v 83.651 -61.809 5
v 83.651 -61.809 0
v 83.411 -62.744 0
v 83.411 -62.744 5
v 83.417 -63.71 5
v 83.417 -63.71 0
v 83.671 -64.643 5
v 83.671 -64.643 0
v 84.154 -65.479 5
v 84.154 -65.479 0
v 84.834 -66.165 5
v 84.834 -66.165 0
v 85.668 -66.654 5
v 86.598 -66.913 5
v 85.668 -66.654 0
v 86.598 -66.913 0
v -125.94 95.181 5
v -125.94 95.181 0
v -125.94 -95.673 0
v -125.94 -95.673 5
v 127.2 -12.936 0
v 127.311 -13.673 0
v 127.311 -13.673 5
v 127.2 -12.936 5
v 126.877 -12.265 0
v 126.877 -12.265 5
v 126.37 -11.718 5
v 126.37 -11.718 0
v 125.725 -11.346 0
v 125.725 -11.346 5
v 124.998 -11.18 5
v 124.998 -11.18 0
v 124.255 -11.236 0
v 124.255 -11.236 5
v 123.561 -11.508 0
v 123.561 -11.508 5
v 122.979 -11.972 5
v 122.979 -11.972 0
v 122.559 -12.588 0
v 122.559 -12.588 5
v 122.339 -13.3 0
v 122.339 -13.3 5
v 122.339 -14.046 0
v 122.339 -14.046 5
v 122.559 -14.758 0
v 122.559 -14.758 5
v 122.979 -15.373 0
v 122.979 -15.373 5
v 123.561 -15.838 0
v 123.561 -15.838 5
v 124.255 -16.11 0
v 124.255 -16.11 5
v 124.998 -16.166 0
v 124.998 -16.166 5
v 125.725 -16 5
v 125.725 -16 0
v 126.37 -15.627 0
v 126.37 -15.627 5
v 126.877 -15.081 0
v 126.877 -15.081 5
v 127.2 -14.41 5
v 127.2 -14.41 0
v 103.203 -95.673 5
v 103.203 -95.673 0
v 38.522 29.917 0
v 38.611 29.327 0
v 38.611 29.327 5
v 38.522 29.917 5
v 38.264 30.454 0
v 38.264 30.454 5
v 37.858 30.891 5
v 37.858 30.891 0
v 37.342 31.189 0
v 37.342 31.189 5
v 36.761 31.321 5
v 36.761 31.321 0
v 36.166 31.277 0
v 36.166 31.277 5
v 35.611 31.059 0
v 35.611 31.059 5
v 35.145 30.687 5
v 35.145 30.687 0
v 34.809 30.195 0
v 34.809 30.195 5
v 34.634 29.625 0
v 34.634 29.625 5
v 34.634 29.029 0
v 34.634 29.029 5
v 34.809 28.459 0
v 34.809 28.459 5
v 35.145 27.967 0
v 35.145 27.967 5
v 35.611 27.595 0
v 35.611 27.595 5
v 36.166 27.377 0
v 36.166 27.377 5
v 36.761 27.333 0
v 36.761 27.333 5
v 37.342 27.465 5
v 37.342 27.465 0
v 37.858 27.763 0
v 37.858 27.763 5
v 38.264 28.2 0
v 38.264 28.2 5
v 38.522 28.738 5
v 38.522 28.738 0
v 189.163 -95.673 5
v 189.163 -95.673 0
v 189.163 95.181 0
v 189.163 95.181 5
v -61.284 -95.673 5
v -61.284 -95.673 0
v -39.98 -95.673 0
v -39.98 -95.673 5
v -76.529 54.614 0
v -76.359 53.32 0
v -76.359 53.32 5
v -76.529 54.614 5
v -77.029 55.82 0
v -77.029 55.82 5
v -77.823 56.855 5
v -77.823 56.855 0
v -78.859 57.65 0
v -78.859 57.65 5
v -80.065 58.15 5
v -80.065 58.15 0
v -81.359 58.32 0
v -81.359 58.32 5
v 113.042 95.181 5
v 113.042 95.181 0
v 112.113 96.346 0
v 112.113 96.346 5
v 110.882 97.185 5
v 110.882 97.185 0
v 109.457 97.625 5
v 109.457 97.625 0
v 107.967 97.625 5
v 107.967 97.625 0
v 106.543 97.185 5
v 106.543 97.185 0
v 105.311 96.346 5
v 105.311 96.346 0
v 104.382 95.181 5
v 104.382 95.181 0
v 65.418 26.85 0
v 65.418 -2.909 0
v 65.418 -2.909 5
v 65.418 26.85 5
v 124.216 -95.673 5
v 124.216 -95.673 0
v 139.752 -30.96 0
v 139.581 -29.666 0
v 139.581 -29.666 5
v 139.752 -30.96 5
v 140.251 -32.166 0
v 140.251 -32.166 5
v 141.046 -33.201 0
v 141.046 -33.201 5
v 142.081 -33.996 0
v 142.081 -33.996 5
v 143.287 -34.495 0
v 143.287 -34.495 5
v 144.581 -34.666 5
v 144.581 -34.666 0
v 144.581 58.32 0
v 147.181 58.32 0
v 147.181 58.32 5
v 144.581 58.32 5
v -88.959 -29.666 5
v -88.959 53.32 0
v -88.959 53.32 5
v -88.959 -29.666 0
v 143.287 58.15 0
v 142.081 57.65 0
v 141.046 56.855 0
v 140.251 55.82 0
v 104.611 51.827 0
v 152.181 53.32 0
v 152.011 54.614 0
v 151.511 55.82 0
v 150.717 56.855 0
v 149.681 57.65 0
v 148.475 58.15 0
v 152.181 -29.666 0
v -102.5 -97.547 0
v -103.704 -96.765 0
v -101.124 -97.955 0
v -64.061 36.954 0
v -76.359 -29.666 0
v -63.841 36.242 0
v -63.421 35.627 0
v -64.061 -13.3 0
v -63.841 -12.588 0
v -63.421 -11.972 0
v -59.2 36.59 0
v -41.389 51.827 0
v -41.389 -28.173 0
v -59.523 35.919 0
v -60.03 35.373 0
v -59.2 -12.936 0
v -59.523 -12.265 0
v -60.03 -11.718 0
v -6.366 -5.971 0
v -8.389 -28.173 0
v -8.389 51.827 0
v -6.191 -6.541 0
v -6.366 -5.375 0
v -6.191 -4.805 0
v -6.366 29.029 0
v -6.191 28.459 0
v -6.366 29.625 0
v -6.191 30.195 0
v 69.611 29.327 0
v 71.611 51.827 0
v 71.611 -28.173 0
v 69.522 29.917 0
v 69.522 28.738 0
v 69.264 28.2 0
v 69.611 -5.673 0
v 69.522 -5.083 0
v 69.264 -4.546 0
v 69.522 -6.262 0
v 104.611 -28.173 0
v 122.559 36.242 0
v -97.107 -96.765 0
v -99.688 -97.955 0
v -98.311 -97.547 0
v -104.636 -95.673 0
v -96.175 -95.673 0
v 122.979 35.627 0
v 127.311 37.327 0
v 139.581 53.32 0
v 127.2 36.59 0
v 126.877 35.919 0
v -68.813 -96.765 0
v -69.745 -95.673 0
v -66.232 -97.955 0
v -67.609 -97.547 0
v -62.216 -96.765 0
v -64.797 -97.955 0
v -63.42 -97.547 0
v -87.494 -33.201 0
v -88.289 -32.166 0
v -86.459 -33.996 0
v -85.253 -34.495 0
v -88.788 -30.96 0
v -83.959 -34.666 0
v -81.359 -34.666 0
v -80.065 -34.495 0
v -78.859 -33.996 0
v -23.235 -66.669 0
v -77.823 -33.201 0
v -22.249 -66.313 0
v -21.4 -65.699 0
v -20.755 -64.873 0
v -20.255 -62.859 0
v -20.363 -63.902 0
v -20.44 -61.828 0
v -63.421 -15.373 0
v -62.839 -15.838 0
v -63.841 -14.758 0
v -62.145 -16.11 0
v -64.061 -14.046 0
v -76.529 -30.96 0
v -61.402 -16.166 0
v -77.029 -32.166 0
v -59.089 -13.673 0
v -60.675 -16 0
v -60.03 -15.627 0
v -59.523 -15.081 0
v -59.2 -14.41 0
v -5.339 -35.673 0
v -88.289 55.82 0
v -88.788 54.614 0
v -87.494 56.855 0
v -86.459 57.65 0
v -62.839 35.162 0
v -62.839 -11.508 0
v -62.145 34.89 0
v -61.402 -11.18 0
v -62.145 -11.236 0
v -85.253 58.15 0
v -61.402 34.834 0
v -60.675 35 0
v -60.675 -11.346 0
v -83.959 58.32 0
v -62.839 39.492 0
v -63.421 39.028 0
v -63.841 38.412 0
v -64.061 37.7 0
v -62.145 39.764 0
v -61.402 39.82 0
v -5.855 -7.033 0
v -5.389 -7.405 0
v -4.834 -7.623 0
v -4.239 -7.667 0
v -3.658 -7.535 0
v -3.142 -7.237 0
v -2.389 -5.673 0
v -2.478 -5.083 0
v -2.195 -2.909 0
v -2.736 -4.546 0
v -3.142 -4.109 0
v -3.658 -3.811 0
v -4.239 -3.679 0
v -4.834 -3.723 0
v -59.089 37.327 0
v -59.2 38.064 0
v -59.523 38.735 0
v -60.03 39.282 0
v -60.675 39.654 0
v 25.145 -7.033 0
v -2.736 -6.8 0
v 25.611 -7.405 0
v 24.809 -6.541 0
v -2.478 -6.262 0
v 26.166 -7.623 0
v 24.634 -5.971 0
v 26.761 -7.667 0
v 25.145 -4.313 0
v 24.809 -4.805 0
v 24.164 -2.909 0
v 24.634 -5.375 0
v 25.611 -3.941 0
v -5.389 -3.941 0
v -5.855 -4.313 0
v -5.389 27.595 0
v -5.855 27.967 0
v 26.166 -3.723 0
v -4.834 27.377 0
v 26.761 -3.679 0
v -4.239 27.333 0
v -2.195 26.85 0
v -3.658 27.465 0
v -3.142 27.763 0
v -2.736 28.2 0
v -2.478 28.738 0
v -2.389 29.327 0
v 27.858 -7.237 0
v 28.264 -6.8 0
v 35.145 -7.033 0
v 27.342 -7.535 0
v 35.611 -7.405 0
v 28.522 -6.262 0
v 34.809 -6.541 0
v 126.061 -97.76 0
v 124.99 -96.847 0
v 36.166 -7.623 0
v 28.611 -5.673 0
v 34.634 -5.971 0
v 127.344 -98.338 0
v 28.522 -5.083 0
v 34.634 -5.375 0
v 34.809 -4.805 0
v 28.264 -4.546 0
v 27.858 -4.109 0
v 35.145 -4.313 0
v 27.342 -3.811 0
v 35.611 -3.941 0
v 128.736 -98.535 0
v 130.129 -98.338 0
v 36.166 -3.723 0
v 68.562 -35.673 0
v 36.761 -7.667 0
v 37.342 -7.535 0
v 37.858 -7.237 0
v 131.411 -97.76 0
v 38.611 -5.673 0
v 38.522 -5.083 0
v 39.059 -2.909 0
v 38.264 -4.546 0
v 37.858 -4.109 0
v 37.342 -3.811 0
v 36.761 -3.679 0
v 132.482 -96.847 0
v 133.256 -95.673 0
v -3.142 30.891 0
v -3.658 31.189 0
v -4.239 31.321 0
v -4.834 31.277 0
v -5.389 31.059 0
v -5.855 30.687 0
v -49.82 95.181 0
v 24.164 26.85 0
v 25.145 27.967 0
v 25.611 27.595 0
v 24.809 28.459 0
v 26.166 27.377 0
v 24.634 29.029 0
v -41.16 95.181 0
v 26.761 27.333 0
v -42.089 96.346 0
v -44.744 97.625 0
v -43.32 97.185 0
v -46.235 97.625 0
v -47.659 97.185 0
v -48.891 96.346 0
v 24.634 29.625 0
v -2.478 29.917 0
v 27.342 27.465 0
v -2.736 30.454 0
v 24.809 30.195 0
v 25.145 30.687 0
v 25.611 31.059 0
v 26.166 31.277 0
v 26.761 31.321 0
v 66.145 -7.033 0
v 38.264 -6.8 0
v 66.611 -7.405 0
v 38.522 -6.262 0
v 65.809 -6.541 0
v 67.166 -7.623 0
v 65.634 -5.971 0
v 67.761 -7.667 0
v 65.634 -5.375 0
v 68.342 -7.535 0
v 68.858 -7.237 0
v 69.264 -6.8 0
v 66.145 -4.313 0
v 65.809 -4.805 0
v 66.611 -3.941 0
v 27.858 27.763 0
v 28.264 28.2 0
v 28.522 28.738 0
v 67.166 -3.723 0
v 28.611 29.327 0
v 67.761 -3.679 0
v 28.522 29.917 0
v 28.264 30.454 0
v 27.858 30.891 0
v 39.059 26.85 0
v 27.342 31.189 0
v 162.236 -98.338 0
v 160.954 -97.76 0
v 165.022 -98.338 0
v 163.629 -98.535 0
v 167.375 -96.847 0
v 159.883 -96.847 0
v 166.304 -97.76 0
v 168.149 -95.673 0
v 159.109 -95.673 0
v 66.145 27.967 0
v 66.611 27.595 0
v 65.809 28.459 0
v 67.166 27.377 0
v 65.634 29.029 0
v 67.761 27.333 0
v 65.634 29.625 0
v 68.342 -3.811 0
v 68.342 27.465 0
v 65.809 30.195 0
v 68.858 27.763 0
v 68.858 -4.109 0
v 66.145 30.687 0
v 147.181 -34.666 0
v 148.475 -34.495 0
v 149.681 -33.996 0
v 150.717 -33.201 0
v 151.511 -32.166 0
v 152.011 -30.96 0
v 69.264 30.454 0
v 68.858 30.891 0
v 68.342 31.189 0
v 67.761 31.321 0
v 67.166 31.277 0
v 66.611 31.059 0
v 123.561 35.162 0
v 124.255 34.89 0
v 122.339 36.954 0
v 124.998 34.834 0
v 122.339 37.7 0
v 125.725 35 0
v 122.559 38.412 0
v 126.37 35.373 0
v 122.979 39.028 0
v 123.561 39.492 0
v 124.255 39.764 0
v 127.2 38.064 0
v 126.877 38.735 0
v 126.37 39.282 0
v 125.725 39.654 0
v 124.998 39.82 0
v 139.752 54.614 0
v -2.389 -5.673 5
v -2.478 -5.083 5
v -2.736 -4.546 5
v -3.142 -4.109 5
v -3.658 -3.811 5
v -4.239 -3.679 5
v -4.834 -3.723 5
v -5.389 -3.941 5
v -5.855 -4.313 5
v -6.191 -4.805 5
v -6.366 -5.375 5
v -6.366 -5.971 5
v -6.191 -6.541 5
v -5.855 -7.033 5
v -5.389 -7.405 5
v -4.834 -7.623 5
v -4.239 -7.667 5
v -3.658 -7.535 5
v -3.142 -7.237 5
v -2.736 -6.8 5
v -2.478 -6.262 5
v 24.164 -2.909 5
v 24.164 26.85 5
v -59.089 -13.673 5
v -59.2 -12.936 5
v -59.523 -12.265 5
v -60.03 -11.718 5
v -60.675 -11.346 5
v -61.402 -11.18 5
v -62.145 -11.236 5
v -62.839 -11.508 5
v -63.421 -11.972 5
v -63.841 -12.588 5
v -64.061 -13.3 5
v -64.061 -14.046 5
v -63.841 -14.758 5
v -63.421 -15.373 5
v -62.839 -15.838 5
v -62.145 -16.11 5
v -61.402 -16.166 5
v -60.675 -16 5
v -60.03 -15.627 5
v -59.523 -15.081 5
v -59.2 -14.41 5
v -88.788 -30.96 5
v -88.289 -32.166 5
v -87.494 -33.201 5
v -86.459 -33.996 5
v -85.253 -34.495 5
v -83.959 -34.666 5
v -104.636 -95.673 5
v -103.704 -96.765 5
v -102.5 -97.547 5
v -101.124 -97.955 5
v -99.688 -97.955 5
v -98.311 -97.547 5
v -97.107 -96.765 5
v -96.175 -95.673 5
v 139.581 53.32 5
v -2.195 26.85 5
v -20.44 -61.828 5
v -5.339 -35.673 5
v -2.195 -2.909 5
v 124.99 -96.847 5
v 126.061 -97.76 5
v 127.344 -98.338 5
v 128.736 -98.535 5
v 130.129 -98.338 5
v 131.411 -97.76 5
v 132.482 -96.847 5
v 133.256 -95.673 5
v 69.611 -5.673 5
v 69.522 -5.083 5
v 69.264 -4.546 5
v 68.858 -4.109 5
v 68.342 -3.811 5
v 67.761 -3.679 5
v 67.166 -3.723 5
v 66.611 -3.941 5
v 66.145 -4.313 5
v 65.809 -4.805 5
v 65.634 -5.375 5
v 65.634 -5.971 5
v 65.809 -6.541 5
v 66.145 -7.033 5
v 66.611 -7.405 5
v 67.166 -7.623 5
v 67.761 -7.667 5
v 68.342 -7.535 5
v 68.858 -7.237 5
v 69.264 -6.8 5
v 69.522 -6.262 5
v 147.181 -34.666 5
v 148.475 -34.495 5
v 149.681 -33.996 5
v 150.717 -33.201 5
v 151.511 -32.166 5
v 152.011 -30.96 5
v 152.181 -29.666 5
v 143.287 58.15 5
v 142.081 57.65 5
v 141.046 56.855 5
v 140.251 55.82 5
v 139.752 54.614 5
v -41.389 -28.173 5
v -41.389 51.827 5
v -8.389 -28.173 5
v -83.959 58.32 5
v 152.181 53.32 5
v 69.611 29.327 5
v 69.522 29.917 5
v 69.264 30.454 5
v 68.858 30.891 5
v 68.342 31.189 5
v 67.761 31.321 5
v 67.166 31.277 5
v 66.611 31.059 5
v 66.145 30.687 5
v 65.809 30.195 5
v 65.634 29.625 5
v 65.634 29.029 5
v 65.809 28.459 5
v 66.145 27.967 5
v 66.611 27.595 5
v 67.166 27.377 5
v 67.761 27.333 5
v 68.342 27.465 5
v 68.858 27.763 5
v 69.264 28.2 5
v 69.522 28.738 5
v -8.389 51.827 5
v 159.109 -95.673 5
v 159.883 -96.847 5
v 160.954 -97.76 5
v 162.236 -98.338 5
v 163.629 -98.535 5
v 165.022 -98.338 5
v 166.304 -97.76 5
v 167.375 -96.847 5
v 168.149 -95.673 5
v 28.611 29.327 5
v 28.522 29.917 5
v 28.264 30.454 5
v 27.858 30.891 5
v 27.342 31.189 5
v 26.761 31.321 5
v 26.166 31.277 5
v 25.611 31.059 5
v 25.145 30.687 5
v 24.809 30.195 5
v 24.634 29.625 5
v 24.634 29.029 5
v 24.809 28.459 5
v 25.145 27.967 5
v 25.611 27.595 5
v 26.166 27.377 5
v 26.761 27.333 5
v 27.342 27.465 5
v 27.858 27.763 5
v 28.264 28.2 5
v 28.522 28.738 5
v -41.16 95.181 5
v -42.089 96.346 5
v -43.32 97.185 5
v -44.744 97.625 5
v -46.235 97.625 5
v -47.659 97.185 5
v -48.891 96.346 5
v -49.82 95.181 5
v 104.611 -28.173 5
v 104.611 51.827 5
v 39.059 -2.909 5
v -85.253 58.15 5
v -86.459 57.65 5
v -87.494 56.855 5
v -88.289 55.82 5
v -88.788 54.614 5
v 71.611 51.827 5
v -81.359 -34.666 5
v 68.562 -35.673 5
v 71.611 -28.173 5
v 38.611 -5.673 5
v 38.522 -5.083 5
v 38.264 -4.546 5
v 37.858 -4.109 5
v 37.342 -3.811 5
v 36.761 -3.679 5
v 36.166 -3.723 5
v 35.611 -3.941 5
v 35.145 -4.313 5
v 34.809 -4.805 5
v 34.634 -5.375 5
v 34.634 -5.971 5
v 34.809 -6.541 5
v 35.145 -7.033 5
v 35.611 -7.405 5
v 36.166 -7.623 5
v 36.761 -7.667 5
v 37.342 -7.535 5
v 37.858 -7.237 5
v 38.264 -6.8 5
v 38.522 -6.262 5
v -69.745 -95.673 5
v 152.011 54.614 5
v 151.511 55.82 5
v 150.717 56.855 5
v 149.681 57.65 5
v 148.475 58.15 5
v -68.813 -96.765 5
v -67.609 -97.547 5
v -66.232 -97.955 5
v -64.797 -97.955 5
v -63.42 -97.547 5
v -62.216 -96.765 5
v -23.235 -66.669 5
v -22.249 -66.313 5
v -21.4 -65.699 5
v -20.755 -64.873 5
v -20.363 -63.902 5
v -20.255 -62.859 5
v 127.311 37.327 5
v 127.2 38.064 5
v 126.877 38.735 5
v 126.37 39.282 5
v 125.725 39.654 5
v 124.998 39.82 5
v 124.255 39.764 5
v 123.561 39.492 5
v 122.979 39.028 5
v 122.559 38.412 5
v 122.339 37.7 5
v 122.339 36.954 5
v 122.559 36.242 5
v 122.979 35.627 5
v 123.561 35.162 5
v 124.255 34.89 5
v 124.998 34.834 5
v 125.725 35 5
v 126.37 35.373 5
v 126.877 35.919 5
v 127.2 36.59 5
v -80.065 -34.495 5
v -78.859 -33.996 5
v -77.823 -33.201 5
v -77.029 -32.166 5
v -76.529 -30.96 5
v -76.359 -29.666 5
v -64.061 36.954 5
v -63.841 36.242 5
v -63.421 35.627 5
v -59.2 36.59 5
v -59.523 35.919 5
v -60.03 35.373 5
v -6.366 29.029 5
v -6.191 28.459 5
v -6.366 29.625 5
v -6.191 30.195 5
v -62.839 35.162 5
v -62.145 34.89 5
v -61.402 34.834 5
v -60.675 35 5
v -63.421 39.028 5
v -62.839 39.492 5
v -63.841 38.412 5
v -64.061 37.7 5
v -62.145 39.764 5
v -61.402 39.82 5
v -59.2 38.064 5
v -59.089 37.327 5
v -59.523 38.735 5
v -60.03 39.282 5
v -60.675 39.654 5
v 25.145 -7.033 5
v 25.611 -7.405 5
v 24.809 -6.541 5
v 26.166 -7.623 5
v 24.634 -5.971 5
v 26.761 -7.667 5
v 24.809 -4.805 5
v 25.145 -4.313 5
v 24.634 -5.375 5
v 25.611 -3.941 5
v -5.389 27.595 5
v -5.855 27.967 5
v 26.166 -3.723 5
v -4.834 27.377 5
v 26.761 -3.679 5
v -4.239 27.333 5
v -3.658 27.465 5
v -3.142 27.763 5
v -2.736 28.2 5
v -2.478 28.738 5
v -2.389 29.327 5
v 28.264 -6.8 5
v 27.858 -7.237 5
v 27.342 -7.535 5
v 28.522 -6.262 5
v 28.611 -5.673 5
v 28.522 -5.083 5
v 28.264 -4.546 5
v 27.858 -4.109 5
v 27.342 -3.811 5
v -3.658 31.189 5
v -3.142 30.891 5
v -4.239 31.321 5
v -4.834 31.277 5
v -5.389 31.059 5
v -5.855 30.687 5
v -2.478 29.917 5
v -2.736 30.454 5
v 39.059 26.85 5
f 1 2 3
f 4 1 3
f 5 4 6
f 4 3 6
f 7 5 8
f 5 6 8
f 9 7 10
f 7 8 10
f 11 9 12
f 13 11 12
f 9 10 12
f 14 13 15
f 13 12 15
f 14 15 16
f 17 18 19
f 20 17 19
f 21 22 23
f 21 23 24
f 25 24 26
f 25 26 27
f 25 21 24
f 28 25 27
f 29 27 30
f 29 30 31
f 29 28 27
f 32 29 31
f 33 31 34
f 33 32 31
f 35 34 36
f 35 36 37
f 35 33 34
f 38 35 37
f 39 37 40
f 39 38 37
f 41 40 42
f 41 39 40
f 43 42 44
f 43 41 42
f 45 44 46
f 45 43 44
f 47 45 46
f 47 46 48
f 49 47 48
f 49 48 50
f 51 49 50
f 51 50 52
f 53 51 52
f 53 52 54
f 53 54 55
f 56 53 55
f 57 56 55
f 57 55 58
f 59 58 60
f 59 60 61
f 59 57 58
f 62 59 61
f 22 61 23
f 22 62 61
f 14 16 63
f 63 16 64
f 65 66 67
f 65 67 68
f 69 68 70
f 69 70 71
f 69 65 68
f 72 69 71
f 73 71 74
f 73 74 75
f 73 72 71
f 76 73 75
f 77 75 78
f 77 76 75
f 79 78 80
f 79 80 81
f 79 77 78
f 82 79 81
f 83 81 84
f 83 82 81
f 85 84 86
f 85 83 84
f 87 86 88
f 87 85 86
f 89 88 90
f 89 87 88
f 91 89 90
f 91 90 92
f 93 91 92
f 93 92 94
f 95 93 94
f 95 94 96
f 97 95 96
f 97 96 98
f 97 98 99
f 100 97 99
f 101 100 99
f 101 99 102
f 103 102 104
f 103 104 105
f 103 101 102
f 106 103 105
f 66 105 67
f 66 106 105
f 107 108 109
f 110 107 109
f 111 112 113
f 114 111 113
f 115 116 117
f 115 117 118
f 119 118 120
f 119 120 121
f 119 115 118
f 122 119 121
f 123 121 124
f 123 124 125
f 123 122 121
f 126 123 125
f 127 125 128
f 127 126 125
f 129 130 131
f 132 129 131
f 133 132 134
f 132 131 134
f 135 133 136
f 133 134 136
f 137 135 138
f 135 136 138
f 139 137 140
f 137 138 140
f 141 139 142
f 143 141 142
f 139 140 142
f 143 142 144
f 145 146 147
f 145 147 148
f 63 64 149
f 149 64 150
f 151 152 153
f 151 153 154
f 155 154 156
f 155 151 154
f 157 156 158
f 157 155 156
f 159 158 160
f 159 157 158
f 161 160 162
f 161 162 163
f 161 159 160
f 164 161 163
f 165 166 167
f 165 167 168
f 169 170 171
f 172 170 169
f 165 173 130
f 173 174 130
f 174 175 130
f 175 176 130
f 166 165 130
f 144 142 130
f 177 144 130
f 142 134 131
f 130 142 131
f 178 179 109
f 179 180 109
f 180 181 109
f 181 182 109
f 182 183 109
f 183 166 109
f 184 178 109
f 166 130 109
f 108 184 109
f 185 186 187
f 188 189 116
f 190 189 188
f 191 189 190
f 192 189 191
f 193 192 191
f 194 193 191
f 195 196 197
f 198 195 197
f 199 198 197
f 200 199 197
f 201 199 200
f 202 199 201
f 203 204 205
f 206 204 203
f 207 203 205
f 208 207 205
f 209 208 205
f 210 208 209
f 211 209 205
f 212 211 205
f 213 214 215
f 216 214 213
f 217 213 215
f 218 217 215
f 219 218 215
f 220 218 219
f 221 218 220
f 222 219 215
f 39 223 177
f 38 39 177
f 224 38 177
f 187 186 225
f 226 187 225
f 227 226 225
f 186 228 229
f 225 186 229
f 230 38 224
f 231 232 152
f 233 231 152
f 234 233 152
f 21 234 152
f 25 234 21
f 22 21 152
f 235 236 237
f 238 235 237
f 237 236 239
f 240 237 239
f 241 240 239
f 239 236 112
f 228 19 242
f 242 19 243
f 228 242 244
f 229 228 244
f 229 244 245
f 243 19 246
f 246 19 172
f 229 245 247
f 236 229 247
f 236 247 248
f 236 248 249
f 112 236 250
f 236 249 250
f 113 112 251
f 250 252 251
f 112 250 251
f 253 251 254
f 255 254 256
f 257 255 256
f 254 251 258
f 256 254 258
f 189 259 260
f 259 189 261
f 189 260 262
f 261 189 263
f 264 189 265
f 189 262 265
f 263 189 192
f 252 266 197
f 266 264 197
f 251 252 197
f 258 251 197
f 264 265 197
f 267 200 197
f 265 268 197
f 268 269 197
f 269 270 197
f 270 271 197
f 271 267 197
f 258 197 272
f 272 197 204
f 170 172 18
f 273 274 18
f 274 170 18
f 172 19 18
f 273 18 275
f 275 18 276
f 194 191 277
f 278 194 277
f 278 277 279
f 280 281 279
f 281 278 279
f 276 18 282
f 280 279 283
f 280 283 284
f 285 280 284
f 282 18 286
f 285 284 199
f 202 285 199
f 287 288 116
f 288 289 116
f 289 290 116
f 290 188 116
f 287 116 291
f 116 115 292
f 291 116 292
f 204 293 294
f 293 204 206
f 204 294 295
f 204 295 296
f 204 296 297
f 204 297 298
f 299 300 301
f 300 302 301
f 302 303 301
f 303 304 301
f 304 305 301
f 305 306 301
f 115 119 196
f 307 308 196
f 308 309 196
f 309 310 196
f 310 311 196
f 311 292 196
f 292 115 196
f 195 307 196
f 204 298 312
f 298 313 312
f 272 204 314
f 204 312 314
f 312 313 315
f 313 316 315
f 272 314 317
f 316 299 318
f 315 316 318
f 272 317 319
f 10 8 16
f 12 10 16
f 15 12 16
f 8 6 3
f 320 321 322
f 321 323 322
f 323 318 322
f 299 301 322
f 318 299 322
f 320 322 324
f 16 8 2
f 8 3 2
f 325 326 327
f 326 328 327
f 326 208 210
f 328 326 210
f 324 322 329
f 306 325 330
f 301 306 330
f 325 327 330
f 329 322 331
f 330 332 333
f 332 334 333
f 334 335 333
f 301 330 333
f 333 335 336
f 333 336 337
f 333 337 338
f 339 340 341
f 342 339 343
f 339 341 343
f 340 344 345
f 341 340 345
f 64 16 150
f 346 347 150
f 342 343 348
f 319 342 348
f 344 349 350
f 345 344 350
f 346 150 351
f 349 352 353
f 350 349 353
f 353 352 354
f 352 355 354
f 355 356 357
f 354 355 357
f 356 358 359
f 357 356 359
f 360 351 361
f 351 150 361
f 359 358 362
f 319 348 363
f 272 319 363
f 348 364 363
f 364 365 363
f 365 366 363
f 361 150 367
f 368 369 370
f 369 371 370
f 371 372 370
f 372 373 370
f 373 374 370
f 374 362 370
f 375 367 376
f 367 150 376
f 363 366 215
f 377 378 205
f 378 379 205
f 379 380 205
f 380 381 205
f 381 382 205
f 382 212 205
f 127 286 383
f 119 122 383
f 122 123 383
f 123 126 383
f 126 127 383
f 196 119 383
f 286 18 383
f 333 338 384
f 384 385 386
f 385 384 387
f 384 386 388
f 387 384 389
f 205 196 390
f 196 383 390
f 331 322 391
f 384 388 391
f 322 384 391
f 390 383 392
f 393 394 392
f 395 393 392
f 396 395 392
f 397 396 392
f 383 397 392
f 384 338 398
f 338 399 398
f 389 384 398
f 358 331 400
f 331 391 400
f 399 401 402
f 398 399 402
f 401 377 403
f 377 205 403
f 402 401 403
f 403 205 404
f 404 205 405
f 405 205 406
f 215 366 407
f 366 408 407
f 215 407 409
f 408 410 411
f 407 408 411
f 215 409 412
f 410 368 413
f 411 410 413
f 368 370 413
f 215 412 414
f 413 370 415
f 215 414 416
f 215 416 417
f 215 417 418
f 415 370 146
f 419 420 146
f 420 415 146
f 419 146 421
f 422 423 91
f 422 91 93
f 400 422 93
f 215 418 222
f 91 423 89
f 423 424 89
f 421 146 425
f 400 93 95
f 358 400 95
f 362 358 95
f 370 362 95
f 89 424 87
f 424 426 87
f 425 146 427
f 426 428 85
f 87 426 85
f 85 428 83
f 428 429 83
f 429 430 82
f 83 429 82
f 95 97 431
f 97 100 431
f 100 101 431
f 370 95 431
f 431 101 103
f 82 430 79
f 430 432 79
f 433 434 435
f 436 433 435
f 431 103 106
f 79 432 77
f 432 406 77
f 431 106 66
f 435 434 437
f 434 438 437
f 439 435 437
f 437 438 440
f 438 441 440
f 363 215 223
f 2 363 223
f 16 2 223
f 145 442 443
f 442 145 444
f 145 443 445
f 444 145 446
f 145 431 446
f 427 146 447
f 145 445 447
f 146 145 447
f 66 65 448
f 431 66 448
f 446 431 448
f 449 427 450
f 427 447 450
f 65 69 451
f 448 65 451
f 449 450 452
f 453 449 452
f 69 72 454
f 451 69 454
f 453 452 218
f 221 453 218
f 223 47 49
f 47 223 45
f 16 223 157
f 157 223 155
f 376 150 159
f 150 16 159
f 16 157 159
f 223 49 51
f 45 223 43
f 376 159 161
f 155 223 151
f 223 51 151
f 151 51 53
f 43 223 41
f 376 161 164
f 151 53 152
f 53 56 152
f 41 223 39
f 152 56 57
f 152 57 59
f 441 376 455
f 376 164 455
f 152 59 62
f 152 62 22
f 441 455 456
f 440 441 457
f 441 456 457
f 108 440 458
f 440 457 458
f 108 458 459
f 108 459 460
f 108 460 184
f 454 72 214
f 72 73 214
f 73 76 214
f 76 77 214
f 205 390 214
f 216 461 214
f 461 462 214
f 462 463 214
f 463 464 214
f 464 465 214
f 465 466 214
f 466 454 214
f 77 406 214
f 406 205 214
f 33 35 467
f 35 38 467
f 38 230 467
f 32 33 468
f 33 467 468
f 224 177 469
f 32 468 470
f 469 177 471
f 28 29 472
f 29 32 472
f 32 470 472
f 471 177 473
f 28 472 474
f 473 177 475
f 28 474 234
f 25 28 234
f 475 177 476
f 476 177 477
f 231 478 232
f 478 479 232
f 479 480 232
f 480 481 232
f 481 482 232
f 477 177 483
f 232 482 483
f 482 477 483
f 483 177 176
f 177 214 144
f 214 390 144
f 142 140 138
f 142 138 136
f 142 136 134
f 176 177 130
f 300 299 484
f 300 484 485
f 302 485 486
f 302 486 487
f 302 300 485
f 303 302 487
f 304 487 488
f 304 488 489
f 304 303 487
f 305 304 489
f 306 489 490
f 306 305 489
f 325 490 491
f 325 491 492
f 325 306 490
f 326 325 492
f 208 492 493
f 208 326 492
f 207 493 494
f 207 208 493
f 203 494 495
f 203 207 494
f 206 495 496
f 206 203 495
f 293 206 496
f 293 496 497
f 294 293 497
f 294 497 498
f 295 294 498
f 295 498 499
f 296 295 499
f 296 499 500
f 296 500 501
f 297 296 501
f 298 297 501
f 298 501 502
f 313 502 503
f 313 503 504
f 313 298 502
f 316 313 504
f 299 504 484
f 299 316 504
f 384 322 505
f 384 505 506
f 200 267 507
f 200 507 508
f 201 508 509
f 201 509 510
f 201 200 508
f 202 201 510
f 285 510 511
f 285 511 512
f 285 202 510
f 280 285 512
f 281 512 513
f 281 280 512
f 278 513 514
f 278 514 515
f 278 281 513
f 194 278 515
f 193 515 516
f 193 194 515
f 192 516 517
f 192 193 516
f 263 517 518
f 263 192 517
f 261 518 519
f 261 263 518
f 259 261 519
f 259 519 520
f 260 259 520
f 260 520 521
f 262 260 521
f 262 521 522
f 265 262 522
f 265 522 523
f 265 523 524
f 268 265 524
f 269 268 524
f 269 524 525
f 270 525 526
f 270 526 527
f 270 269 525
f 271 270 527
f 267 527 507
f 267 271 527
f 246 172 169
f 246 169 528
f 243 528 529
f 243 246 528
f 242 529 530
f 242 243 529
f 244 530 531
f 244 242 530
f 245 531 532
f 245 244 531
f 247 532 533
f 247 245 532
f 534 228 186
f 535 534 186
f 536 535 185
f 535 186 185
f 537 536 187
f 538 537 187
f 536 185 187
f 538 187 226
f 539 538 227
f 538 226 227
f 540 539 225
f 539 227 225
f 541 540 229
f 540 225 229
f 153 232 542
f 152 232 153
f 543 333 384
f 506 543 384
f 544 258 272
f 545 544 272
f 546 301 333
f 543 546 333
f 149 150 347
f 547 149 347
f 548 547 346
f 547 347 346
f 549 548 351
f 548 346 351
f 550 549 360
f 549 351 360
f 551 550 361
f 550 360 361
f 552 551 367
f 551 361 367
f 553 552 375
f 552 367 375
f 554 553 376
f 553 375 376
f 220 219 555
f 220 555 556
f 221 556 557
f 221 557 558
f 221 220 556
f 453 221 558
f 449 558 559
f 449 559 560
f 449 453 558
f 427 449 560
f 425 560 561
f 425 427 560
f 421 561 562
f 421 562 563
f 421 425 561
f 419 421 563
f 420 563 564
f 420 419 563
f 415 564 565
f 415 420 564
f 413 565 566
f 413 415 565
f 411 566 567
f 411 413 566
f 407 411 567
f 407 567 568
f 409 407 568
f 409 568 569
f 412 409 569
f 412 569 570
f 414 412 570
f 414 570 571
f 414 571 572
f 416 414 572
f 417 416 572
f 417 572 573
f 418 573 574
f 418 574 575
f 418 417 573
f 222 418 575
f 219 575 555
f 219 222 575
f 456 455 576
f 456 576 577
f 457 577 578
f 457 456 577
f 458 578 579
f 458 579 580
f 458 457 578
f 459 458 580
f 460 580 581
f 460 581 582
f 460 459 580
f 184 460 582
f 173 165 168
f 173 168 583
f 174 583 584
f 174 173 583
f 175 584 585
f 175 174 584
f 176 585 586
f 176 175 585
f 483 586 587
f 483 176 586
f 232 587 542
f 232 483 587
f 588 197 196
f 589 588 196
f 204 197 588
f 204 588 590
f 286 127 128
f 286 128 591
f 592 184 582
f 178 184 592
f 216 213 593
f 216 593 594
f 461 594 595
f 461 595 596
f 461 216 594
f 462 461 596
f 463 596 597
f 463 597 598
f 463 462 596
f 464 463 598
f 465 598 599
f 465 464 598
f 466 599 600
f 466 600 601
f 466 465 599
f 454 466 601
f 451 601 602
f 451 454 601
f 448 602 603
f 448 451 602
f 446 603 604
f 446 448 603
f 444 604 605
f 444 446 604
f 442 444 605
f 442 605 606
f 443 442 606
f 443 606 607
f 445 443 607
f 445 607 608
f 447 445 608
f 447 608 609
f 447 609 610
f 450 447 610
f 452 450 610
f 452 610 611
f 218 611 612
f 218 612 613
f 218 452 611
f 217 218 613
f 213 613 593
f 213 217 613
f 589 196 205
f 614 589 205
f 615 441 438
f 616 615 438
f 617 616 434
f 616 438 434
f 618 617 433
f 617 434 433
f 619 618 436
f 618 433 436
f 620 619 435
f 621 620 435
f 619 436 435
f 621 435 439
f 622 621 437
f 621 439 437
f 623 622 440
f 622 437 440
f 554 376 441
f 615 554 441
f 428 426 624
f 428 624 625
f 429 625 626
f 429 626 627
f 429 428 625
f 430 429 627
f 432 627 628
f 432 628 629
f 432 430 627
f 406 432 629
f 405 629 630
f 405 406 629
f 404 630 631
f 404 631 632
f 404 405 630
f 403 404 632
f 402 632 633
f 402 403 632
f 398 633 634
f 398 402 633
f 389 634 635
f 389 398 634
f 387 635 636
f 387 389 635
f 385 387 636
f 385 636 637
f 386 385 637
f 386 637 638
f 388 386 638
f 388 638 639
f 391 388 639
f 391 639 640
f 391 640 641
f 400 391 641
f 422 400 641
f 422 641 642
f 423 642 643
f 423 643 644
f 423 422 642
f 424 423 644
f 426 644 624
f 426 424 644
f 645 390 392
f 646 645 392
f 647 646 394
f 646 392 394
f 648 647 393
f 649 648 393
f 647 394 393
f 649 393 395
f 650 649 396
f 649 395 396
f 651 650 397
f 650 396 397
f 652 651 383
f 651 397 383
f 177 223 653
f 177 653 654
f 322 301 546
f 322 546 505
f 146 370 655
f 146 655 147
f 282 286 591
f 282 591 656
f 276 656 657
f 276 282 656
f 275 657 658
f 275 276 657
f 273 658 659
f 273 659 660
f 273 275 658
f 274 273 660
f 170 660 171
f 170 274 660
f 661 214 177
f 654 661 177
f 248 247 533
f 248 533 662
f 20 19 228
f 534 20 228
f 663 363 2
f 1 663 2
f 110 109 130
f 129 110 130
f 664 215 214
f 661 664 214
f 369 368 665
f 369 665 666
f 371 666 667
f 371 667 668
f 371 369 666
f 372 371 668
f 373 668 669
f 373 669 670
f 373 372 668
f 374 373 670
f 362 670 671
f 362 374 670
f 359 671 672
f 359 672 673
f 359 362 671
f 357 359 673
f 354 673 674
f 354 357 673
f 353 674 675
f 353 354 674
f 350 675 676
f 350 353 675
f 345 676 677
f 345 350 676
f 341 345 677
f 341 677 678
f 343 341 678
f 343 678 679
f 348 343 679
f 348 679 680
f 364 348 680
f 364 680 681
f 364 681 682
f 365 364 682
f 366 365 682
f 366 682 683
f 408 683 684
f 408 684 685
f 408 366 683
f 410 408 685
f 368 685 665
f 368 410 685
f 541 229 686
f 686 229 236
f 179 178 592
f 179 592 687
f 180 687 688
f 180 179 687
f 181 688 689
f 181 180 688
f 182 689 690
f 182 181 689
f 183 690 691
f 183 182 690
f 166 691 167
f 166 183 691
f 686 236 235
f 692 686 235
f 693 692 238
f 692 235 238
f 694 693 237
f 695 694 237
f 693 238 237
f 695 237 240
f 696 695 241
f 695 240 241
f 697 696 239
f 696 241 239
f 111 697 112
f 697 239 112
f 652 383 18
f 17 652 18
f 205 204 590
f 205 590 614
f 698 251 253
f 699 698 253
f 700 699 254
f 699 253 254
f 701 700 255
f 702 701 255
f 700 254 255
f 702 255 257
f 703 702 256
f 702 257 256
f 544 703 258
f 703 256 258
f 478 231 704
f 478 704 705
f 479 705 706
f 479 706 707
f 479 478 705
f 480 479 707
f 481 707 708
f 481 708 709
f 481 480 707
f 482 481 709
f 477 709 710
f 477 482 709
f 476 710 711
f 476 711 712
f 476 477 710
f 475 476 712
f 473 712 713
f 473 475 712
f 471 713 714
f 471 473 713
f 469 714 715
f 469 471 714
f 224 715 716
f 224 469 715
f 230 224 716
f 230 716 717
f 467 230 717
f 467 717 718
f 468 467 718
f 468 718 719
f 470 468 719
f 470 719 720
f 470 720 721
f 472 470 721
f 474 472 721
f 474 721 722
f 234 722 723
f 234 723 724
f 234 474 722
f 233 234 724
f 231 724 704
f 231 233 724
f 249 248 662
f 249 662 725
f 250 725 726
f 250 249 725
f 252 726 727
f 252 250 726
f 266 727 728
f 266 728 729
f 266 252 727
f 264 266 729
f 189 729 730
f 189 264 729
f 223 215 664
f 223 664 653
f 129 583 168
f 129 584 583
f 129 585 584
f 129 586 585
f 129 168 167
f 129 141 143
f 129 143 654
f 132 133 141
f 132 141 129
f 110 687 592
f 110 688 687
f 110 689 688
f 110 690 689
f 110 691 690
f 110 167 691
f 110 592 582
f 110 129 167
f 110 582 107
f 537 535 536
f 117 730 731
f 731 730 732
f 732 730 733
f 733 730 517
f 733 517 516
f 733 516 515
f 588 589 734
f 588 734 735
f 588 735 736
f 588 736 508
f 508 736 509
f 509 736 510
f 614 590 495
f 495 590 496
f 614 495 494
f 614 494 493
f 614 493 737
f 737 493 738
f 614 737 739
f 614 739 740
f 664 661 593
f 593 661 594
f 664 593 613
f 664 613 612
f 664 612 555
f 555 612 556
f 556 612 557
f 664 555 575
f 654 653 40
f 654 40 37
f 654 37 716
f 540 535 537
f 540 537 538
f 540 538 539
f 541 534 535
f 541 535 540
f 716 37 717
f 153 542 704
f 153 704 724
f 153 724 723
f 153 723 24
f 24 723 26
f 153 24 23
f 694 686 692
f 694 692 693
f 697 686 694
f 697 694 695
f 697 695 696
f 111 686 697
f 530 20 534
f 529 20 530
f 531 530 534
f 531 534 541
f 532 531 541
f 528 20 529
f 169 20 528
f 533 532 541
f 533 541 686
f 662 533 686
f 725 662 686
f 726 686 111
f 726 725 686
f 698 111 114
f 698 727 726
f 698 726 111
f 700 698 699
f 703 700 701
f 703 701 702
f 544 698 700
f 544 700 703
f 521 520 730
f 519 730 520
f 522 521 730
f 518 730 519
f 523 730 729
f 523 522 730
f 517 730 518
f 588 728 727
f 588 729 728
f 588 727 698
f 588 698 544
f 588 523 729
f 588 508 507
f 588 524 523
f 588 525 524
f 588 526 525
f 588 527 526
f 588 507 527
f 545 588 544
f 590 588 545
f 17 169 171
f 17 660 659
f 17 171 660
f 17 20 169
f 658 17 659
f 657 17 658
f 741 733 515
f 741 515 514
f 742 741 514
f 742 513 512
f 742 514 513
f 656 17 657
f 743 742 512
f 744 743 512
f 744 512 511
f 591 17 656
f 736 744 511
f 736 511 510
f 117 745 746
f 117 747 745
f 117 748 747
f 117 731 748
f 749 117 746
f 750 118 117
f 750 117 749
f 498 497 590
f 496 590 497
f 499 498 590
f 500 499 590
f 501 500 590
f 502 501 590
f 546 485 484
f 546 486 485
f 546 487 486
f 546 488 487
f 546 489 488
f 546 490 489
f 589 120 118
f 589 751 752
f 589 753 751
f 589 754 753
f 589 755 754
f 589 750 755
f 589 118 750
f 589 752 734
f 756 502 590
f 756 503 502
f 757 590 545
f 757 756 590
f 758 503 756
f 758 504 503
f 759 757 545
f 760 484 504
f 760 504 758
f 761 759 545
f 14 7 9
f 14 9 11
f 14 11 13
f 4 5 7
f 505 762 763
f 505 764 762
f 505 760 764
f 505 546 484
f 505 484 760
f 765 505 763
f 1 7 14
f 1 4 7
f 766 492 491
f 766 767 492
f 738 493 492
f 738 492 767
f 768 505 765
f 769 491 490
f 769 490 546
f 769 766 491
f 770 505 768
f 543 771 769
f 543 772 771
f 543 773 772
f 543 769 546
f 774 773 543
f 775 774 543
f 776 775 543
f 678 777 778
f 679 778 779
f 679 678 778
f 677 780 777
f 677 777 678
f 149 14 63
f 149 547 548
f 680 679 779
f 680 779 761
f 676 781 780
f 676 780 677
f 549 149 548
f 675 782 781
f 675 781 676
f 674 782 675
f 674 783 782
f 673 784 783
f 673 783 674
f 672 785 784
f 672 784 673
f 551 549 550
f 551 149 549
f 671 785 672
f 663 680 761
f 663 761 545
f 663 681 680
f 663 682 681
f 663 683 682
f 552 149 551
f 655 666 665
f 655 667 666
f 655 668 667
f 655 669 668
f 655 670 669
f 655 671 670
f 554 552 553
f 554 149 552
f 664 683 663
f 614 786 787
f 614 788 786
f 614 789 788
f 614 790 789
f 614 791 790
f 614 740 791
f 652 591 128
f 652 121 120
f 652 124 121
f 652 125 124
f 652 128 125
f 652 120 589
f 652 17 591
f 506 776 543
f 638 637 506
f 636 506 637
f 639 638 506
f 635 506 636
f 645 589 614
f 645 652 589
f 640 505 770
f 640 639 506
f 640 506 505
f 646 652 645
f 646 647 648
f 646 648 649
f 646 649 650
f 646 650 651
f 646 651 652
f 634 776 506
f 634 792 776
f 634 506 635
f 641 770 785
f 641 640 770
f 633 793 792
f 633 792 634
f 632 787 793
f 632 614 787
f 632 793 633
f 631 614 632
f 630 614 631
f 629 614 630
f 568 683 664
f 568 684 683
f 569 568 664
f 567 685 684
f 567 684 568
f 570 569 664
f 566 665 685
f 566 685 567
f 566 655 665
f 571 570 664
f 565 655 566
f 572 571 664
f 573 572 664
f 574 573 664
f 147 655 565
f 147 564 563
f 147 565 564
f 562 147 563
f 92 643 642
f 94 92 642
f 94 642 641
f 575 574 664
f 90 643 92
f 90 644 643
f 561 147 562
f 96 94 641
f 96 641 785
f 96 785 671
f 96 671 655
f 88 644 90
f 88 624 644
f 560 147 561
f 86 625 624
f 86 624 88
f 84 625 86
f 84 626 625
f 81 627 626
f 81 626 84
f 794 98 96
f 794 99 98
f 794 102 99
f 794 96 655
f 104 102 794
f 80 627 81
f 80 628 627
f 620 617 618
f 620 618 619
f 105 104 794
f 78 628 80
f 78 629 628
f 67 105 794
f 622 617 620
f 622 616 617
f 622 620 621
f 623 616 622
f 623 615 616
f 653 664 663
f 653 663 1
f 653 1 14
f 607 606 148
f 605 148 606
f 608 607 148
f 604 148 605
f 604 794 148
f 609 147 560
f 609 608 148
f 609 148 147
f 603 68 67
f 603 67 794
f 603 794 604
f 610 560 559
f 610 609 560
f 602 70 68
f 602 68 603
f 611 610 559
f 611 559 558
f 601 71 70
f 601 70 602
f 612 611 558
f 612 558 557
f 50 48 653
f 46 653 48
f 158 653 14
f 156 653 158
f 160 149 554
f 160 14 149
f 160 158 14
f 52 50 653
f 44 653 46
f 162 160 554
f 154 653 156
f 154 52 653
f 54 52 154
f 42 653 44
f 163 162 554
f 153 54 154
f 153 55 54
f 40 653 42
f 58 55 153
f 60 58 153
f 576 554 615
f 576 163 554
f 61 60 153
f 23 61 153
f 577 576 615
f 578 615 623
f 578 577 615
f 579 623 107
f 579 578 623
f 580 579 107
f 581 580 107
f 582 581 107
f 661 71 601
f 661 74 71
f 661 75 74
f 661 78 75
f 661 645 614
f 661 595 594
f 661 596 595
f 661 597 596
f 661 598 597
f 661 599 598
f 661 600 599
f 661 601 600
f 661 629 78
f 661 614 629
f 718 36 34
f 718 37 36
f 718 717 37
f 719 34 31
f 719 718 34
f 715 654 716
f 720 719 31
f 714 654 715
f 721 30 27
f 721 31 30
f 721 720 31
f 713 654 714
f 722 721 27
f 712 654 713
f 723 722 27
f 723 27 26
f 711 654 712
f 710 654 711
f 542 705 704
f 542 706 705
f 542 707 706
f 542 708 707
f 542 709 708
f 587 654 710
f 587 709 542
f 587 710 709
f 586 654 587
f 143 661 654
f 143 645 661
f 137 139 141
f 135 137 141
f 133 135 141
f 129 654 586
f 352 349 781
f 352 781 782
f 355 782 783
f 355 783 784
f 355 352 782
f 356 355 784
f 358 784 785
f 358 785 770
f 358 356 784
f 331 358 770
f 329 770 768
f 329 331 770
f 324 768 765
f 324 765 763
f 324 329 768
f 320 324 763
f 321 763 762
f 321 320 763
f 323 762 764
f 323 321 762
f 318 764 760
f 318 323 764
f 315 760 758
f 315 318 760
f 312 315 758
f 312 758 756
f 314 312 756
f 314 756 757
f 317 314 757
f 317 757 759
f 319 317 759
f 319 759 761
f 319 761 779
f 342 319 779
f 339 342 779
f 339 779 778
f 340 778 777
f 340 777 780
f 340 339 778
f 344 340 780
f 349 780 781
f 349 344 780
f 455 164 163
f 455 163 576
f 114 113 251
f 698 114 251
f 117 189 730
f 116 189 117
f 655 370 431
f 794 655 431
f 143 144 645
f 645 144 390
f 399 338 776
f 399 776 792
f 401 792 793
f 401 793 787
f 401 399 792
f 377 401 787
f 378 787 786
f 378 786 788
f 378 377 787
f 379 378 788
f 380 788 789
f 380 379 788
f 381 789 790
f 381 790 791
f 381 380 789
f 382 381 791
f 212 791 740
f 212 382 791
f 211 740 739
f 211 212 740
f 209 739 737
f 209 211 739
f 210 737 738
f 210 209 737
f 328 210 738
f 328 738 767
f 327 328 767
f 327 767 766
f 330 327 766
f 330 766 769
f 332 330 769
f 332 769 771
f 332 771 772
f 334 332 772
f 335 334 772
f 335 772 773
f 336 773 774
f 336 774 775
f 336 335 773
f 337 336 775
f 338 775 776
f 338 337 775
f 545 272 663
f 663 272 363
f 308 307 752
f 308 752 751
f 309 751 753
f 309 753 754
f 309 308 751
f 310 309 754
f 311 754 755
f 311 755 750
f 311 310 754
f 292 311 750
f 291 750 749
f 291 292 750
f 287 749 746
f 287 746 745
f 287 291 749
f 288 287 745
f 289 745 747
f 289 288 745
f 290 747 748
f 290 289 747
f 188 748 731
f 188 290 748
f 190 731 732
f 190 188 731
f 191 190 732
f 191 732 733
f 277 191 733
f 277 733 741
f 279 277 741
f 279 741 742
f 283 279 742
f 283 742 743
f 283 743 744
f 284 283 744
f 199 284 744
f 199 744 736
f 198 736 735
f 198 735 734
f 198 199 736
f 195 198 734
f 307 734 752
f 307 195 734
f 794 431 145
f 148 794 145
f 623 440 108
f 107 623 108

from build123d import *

# Parameters (mm, degrees)
SKETCH1_R           = 2
SKETCH1_R_2         = 2.5
SKETCH1_W           = 33
SKETCH1_H           = 80
SKETCH1_W_2         = 26.358753283
SKETCH1_H_2         = 29.759882739
BOSS_EXTRUDE1_DEPTH = 5


with BuildPart() as part:
    # Sketch1 → Boss-Extrude1 (new body)
    with BuildSketch(Plane.XY):
        with BuildLine():
            Line((-125.940029712, -95.672909388), (-104.635809021, -95.672909388))
            ThreePointArc((-104.635809021, -95.672909388), (-100.405628635, -98.00728115), (-96.175448249, -95.672909388))
            Line((-96.175448249, -95.672909388), (-69.744751877, -95.672909388))
            ThreePointArc((-69.744751877, -95.672909388), (-65.514571491, -98.00728115), (-61.284391105, -95.672909388))
            Line((-61.284391105, -95.672909388), (-39.980170414, -95.672909388))
            Line((-39.980170414, -95.672909388), (-23.23481866, -66.66910936))
            ThreePointArc((-23.23481866, -66.66910936), (-20.75474442, -64.873494769), (-20.439733688, -61.827880177))
            Line((-20.439733688, -61.827880177), (-5.339154263, -35.672909388))
            Line((-5.339154263, -35.672909388), (68.561680194, -35.672909388))
            Line((68.561680194, -35.672909388), (83.651079822, -61.808516201))
            ThreePointArc((83.651079822, -61.808516201), (83.885152959, -65.076529173), (86.598298645, -66.913248943))
            Line((86.598298645, -66.913248943), (103.202696345, -95.672909388))
            Line((103.202696345, -95.672909388), (124.216145364, -95.672909388))
            ThreePointArc((124.216145364, -95.672909388), (128.736262965, -98.535495794), (133.256380567, -95.672909388))
            Line((133.256380567, -95.672909388), (159.108871421, -95.672909388))
            ThreePointArc((159.108871421, -95.672909388), (163.628989022, -98.535495794), (168.149106623, -95.672909388))
            Line((168.149106623, -95.672909388), (189.162555642, -95.672909388))
            Line((189.162555642, -95.672909388), (189.162555642, 95.180535099))
            Line((189.162555642, 95.180535099), (113.042402195, 95.180535099))
            ThreePointArc((113.042402195, 95.180535099), (108.712275177, 97.680535099), (104.382148158, 95.180535099))
            Line((104.382148158, 95.180535099), (-41.159528738, 95.180535099))
            ThreePointArc((-41.159528738, 95.180535099), (-45.489655757, 97.680535099), (-49.819782776, 95.180535099))
            Line((-49.819782776, 95.180535099), (-125.940029712, 95.180535099))
            Line((-125.940029712, 95.180535099), (-125.940029712, -95.672909388))
        make_face()
        with Locations((67.611262965, 29.327090612)):
            Circle(SKETCH1_R, mode=Mode.SUBTRACT)
        with Locations((36.611262965, 29.327090612)):
            Circle(SKETCH1_R, mode=Mode.SUBTRACT)
        with Locations((26.611262965, 29.327090612)):
            Circle(SKETCH1_R, mode=Mode.SUBTRACT)
        with Locations((-4.388737035, 29.327090612)):
            Circle(SKETCH1_R, mode=Mode.SUBTRACT)
        with Locations((67.611262965, -5.672909388)):
            Circle(SKETCH1_R, mode=Mode.SUBTRACT)
        with Locations((36.611262965, -5.672909388)):
            Circle(SKETCH1_R, mode=Mode.SUBTRACT)
        with Locations((26.611262965, -5.672909388)):
            Circle(SKETCH1_R, mode=Mode.SUBTRACT)
        with Locations((-4.388737035, -5.672909388)):
            Circle(SKETCH1_R, mode=Mode.SUBTRACT)
        with Locations((-61.588737035, -13.672909388)):
            Circle(SKETCH1_R_2, mode=Mode.SUBTRACT)
        with Locations((-61.588737035, 37.327090612)):
            Circle(SKETCH1_R_2, mode=Mode.SUBTRACT)
        with Locations((124.811262965, 37.327090612)):
            Circle(SKETCH1_R_2, mode=Mode.SUBTRACT)
        with Locations((124.811262965, -13.672909388)):
            Circle(SKETCH1_R_2, mode=Mode.SUBTRACT)
        with Locations((-24.888737035, 11.827090612)):
            Rectangle(SKETCH1_W, SKETCH1_H, mode=Mode.SUBTRACT)
        with Locations((88.111262965, 11.827090612)):
            Rectangle(SKETCH1_W, SKETCH1_H, mode=Mode.SUBTRACT)
        with BuildLine():
            Line((144.581262965, -34.665729578), (147.181262965, -34.665729578))
            ThreePointArc((147.181262965, -34.665729578), (150.716796871, -33.201263484), (152.181262965, -29.665729578))
            Line((152.181262965, -29.665729578), (152.181262965, 53.319910802))
            ThreePointArc((152.181262965, 53.319910802), (150.716796871, 56.855444707), (147.181262965, 58.319910802))
            Line((147.181262965, 58.319910802), (144.581262965, 58.319910802))
            ThreePointArc((144.581262965, 58.319910802), (141.04572906, 56.855444707), (139.581262965, 53.319910802))
            Line((139.581262965, 53.319910802), (139.581262965, -29.665729578))
            ThreePointArc((139.581262965, -29.665729578), (141.04572906, -33.201263484), (144.581262965, -34.665729578))
        make_face(mode=Mode.SUBTRACT)
        with BuildLine():
            Line((-83.958737035, -34.665729578), (-81.358737035, -34.665729578))
            ThreePointArc((-81.358737035, -34.665729578), (-77.823203129, -33.201263484), (-76.358737035, -29.665729578))
            Line((-76.358737035, -29.665729578), (-76.358737035, 53.319910802))
            ThreePointArc((-76.358737035, 53.319910802), (-77.823203129, 56.855444707), (-81.358737035, 58.319910802))
            Line((-81.358737035, 58.319910802), (-83.958737035, 58.319910802))
            ThreePointArc((-83.958737035, 58.319910802), (-87.49427094, 56.855444707), (-88.958737035, 53.319910802))
            Line((-88.958737035, 53.319910802), (-88.958737035, -29.665729578))
            ThreePointArc((-88.958737035, -29.665729578), (-87.49427094, -33.201263484), (-83.958737035, -34.665729578))
        make_face(mode=Mode.SUBTRACT)
        with Locations((52.23838386, 11.97050865)):
            Rectangle(SKETCH1_W_2, SKETCH1_H_2, mode=Mode.SUBTRACT)
        with Locations((10.98423556, 11.97050865)):
            Rectangle(SKETCH1_W_2, SKETCH1_H_2, mode=Mode.SUBTRACT)
    extrude(amount=BOSS_EXTRUDE1_DEPTH)


solid = part.part
